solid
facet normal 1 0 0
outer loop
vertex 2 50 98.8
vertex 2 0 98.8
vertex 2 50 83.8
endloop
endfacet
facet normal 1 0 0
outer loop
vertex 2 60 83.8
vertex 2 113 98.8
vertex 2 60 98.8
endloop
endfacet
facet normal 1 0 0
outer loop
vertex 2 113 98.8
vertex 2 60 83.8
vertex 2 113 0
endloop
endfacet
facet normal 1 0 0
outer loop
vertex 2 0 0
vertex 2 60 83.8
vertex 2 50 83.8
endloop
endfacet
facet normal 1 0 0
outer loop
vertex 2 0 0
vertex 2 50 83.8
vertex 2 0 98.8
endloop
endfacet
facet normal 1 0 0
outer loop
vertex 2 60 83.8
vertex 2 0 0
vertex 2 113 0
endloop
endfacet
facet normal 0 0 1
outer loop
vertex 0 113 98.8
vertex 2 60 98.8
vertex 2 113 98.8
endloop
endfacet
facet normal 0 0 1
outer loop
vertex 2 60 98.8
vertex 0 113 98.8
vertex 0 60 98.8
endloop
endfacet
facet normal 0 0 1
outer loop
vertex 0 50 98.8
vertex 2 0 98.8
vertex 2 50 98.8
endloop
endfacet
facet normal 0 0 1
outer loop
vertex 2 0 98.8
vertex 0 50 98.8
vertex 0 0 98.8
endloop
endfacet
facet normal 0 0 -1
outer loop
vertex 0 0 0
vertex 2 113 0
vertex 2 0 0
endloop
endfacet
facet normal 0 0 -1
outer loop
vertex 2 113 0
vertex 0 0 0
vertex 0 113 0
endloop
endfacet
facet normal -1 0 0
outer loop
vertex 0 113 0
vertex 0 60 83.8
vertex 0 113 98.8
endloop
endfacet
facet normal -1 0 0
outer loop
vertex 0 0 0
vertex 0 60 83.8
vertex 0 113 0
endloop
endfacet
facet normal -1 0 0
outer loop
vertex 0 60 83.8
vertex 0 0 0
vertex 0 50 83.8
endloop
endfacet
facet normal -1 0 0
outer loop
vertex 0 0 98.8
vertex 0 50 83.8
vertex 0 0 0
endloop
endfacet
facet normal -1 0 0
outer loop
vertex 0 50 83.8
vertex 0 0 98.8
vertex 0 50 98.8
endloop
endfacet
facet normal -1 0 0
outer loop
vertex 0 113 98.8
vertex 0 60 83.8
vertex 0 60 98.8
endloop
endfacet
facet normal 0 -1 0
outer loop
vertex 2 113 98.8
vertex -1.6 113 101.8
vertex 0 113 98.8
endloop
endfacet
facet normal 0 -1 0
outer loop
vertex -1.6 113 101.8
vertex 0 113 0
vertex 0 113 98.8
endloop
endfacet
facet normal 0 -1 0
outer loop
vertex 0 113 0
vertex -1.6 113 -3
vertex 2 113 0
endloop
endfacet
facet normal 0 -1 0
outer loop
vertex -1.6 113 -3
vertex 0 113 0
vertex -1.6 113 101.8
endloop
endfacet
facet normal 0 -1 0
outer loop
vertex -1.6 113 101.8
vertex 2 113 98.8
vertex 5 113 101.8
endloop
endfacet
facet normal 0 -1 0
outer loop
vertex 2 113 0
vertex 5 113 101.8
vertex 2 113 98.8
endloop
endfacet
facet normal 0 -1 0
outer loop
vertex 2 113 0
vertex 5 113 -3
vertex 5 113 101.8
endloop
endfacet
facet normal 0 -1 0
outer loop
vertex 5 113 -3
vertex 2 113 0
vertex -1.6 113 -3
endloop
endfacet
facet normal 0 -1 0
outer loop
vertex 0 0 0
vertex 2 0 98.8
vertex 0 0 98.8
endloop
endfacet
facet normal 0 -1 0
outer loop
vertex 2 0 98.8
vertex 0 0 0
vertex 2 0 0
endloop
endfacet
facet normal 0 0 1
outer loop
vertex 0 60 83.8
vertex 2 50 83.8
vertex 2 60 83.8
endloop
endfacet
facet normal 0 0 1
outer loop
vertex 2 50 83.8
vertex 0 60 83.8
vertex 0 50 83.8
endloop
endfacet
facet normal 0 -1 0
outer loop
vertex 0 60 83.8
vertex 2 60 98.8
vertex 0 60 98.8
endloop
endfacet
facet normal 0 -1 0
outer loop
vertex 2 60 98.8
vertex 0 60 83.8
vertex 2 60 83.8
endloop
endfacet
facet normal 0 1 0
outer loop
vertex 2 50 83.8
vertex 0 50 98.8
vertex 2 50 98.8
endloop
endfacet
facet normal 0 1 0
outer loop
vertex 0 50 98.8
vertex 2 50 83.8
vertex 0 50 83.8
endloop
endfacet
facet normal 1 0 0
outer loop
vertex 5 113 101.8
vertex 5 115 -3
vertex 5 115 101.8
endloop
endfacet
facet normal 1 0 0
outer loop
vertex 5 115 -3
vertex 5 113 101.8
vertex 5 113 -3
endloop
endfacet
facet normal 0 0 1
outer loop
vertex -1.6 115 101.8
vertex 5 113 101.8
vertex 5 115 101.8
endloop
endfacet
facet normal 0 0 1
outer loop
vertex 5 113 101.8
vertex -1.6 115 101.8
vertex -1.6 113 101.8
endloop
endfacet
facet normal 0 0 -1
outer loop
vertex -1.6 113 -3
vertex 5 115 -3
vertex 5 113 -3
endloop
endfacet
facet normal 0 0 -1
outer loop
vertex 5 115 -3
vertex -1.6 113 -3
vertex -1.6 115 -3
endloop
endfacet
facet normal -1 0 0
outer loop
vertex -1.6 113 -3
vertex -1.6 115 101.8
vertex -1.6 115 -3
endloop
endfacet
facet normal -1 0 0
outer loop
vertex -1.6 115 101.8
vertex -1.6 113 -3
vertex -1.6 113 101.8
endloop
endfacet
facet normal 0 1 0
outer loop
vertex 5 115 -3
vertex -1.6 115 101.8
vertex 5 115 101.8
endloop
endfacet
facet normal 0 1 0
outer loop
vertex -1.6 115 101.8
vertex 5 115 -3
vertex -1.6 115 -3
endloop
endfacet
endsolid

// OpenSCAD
difference(){
cube([2, 113, 98.8]);
translate([-1, 50, 83.8]){
cube([4, 10, 17]);
    }
}
translate([-1.6, 113, -3])
cube([6.6, 2, 104.8]);
